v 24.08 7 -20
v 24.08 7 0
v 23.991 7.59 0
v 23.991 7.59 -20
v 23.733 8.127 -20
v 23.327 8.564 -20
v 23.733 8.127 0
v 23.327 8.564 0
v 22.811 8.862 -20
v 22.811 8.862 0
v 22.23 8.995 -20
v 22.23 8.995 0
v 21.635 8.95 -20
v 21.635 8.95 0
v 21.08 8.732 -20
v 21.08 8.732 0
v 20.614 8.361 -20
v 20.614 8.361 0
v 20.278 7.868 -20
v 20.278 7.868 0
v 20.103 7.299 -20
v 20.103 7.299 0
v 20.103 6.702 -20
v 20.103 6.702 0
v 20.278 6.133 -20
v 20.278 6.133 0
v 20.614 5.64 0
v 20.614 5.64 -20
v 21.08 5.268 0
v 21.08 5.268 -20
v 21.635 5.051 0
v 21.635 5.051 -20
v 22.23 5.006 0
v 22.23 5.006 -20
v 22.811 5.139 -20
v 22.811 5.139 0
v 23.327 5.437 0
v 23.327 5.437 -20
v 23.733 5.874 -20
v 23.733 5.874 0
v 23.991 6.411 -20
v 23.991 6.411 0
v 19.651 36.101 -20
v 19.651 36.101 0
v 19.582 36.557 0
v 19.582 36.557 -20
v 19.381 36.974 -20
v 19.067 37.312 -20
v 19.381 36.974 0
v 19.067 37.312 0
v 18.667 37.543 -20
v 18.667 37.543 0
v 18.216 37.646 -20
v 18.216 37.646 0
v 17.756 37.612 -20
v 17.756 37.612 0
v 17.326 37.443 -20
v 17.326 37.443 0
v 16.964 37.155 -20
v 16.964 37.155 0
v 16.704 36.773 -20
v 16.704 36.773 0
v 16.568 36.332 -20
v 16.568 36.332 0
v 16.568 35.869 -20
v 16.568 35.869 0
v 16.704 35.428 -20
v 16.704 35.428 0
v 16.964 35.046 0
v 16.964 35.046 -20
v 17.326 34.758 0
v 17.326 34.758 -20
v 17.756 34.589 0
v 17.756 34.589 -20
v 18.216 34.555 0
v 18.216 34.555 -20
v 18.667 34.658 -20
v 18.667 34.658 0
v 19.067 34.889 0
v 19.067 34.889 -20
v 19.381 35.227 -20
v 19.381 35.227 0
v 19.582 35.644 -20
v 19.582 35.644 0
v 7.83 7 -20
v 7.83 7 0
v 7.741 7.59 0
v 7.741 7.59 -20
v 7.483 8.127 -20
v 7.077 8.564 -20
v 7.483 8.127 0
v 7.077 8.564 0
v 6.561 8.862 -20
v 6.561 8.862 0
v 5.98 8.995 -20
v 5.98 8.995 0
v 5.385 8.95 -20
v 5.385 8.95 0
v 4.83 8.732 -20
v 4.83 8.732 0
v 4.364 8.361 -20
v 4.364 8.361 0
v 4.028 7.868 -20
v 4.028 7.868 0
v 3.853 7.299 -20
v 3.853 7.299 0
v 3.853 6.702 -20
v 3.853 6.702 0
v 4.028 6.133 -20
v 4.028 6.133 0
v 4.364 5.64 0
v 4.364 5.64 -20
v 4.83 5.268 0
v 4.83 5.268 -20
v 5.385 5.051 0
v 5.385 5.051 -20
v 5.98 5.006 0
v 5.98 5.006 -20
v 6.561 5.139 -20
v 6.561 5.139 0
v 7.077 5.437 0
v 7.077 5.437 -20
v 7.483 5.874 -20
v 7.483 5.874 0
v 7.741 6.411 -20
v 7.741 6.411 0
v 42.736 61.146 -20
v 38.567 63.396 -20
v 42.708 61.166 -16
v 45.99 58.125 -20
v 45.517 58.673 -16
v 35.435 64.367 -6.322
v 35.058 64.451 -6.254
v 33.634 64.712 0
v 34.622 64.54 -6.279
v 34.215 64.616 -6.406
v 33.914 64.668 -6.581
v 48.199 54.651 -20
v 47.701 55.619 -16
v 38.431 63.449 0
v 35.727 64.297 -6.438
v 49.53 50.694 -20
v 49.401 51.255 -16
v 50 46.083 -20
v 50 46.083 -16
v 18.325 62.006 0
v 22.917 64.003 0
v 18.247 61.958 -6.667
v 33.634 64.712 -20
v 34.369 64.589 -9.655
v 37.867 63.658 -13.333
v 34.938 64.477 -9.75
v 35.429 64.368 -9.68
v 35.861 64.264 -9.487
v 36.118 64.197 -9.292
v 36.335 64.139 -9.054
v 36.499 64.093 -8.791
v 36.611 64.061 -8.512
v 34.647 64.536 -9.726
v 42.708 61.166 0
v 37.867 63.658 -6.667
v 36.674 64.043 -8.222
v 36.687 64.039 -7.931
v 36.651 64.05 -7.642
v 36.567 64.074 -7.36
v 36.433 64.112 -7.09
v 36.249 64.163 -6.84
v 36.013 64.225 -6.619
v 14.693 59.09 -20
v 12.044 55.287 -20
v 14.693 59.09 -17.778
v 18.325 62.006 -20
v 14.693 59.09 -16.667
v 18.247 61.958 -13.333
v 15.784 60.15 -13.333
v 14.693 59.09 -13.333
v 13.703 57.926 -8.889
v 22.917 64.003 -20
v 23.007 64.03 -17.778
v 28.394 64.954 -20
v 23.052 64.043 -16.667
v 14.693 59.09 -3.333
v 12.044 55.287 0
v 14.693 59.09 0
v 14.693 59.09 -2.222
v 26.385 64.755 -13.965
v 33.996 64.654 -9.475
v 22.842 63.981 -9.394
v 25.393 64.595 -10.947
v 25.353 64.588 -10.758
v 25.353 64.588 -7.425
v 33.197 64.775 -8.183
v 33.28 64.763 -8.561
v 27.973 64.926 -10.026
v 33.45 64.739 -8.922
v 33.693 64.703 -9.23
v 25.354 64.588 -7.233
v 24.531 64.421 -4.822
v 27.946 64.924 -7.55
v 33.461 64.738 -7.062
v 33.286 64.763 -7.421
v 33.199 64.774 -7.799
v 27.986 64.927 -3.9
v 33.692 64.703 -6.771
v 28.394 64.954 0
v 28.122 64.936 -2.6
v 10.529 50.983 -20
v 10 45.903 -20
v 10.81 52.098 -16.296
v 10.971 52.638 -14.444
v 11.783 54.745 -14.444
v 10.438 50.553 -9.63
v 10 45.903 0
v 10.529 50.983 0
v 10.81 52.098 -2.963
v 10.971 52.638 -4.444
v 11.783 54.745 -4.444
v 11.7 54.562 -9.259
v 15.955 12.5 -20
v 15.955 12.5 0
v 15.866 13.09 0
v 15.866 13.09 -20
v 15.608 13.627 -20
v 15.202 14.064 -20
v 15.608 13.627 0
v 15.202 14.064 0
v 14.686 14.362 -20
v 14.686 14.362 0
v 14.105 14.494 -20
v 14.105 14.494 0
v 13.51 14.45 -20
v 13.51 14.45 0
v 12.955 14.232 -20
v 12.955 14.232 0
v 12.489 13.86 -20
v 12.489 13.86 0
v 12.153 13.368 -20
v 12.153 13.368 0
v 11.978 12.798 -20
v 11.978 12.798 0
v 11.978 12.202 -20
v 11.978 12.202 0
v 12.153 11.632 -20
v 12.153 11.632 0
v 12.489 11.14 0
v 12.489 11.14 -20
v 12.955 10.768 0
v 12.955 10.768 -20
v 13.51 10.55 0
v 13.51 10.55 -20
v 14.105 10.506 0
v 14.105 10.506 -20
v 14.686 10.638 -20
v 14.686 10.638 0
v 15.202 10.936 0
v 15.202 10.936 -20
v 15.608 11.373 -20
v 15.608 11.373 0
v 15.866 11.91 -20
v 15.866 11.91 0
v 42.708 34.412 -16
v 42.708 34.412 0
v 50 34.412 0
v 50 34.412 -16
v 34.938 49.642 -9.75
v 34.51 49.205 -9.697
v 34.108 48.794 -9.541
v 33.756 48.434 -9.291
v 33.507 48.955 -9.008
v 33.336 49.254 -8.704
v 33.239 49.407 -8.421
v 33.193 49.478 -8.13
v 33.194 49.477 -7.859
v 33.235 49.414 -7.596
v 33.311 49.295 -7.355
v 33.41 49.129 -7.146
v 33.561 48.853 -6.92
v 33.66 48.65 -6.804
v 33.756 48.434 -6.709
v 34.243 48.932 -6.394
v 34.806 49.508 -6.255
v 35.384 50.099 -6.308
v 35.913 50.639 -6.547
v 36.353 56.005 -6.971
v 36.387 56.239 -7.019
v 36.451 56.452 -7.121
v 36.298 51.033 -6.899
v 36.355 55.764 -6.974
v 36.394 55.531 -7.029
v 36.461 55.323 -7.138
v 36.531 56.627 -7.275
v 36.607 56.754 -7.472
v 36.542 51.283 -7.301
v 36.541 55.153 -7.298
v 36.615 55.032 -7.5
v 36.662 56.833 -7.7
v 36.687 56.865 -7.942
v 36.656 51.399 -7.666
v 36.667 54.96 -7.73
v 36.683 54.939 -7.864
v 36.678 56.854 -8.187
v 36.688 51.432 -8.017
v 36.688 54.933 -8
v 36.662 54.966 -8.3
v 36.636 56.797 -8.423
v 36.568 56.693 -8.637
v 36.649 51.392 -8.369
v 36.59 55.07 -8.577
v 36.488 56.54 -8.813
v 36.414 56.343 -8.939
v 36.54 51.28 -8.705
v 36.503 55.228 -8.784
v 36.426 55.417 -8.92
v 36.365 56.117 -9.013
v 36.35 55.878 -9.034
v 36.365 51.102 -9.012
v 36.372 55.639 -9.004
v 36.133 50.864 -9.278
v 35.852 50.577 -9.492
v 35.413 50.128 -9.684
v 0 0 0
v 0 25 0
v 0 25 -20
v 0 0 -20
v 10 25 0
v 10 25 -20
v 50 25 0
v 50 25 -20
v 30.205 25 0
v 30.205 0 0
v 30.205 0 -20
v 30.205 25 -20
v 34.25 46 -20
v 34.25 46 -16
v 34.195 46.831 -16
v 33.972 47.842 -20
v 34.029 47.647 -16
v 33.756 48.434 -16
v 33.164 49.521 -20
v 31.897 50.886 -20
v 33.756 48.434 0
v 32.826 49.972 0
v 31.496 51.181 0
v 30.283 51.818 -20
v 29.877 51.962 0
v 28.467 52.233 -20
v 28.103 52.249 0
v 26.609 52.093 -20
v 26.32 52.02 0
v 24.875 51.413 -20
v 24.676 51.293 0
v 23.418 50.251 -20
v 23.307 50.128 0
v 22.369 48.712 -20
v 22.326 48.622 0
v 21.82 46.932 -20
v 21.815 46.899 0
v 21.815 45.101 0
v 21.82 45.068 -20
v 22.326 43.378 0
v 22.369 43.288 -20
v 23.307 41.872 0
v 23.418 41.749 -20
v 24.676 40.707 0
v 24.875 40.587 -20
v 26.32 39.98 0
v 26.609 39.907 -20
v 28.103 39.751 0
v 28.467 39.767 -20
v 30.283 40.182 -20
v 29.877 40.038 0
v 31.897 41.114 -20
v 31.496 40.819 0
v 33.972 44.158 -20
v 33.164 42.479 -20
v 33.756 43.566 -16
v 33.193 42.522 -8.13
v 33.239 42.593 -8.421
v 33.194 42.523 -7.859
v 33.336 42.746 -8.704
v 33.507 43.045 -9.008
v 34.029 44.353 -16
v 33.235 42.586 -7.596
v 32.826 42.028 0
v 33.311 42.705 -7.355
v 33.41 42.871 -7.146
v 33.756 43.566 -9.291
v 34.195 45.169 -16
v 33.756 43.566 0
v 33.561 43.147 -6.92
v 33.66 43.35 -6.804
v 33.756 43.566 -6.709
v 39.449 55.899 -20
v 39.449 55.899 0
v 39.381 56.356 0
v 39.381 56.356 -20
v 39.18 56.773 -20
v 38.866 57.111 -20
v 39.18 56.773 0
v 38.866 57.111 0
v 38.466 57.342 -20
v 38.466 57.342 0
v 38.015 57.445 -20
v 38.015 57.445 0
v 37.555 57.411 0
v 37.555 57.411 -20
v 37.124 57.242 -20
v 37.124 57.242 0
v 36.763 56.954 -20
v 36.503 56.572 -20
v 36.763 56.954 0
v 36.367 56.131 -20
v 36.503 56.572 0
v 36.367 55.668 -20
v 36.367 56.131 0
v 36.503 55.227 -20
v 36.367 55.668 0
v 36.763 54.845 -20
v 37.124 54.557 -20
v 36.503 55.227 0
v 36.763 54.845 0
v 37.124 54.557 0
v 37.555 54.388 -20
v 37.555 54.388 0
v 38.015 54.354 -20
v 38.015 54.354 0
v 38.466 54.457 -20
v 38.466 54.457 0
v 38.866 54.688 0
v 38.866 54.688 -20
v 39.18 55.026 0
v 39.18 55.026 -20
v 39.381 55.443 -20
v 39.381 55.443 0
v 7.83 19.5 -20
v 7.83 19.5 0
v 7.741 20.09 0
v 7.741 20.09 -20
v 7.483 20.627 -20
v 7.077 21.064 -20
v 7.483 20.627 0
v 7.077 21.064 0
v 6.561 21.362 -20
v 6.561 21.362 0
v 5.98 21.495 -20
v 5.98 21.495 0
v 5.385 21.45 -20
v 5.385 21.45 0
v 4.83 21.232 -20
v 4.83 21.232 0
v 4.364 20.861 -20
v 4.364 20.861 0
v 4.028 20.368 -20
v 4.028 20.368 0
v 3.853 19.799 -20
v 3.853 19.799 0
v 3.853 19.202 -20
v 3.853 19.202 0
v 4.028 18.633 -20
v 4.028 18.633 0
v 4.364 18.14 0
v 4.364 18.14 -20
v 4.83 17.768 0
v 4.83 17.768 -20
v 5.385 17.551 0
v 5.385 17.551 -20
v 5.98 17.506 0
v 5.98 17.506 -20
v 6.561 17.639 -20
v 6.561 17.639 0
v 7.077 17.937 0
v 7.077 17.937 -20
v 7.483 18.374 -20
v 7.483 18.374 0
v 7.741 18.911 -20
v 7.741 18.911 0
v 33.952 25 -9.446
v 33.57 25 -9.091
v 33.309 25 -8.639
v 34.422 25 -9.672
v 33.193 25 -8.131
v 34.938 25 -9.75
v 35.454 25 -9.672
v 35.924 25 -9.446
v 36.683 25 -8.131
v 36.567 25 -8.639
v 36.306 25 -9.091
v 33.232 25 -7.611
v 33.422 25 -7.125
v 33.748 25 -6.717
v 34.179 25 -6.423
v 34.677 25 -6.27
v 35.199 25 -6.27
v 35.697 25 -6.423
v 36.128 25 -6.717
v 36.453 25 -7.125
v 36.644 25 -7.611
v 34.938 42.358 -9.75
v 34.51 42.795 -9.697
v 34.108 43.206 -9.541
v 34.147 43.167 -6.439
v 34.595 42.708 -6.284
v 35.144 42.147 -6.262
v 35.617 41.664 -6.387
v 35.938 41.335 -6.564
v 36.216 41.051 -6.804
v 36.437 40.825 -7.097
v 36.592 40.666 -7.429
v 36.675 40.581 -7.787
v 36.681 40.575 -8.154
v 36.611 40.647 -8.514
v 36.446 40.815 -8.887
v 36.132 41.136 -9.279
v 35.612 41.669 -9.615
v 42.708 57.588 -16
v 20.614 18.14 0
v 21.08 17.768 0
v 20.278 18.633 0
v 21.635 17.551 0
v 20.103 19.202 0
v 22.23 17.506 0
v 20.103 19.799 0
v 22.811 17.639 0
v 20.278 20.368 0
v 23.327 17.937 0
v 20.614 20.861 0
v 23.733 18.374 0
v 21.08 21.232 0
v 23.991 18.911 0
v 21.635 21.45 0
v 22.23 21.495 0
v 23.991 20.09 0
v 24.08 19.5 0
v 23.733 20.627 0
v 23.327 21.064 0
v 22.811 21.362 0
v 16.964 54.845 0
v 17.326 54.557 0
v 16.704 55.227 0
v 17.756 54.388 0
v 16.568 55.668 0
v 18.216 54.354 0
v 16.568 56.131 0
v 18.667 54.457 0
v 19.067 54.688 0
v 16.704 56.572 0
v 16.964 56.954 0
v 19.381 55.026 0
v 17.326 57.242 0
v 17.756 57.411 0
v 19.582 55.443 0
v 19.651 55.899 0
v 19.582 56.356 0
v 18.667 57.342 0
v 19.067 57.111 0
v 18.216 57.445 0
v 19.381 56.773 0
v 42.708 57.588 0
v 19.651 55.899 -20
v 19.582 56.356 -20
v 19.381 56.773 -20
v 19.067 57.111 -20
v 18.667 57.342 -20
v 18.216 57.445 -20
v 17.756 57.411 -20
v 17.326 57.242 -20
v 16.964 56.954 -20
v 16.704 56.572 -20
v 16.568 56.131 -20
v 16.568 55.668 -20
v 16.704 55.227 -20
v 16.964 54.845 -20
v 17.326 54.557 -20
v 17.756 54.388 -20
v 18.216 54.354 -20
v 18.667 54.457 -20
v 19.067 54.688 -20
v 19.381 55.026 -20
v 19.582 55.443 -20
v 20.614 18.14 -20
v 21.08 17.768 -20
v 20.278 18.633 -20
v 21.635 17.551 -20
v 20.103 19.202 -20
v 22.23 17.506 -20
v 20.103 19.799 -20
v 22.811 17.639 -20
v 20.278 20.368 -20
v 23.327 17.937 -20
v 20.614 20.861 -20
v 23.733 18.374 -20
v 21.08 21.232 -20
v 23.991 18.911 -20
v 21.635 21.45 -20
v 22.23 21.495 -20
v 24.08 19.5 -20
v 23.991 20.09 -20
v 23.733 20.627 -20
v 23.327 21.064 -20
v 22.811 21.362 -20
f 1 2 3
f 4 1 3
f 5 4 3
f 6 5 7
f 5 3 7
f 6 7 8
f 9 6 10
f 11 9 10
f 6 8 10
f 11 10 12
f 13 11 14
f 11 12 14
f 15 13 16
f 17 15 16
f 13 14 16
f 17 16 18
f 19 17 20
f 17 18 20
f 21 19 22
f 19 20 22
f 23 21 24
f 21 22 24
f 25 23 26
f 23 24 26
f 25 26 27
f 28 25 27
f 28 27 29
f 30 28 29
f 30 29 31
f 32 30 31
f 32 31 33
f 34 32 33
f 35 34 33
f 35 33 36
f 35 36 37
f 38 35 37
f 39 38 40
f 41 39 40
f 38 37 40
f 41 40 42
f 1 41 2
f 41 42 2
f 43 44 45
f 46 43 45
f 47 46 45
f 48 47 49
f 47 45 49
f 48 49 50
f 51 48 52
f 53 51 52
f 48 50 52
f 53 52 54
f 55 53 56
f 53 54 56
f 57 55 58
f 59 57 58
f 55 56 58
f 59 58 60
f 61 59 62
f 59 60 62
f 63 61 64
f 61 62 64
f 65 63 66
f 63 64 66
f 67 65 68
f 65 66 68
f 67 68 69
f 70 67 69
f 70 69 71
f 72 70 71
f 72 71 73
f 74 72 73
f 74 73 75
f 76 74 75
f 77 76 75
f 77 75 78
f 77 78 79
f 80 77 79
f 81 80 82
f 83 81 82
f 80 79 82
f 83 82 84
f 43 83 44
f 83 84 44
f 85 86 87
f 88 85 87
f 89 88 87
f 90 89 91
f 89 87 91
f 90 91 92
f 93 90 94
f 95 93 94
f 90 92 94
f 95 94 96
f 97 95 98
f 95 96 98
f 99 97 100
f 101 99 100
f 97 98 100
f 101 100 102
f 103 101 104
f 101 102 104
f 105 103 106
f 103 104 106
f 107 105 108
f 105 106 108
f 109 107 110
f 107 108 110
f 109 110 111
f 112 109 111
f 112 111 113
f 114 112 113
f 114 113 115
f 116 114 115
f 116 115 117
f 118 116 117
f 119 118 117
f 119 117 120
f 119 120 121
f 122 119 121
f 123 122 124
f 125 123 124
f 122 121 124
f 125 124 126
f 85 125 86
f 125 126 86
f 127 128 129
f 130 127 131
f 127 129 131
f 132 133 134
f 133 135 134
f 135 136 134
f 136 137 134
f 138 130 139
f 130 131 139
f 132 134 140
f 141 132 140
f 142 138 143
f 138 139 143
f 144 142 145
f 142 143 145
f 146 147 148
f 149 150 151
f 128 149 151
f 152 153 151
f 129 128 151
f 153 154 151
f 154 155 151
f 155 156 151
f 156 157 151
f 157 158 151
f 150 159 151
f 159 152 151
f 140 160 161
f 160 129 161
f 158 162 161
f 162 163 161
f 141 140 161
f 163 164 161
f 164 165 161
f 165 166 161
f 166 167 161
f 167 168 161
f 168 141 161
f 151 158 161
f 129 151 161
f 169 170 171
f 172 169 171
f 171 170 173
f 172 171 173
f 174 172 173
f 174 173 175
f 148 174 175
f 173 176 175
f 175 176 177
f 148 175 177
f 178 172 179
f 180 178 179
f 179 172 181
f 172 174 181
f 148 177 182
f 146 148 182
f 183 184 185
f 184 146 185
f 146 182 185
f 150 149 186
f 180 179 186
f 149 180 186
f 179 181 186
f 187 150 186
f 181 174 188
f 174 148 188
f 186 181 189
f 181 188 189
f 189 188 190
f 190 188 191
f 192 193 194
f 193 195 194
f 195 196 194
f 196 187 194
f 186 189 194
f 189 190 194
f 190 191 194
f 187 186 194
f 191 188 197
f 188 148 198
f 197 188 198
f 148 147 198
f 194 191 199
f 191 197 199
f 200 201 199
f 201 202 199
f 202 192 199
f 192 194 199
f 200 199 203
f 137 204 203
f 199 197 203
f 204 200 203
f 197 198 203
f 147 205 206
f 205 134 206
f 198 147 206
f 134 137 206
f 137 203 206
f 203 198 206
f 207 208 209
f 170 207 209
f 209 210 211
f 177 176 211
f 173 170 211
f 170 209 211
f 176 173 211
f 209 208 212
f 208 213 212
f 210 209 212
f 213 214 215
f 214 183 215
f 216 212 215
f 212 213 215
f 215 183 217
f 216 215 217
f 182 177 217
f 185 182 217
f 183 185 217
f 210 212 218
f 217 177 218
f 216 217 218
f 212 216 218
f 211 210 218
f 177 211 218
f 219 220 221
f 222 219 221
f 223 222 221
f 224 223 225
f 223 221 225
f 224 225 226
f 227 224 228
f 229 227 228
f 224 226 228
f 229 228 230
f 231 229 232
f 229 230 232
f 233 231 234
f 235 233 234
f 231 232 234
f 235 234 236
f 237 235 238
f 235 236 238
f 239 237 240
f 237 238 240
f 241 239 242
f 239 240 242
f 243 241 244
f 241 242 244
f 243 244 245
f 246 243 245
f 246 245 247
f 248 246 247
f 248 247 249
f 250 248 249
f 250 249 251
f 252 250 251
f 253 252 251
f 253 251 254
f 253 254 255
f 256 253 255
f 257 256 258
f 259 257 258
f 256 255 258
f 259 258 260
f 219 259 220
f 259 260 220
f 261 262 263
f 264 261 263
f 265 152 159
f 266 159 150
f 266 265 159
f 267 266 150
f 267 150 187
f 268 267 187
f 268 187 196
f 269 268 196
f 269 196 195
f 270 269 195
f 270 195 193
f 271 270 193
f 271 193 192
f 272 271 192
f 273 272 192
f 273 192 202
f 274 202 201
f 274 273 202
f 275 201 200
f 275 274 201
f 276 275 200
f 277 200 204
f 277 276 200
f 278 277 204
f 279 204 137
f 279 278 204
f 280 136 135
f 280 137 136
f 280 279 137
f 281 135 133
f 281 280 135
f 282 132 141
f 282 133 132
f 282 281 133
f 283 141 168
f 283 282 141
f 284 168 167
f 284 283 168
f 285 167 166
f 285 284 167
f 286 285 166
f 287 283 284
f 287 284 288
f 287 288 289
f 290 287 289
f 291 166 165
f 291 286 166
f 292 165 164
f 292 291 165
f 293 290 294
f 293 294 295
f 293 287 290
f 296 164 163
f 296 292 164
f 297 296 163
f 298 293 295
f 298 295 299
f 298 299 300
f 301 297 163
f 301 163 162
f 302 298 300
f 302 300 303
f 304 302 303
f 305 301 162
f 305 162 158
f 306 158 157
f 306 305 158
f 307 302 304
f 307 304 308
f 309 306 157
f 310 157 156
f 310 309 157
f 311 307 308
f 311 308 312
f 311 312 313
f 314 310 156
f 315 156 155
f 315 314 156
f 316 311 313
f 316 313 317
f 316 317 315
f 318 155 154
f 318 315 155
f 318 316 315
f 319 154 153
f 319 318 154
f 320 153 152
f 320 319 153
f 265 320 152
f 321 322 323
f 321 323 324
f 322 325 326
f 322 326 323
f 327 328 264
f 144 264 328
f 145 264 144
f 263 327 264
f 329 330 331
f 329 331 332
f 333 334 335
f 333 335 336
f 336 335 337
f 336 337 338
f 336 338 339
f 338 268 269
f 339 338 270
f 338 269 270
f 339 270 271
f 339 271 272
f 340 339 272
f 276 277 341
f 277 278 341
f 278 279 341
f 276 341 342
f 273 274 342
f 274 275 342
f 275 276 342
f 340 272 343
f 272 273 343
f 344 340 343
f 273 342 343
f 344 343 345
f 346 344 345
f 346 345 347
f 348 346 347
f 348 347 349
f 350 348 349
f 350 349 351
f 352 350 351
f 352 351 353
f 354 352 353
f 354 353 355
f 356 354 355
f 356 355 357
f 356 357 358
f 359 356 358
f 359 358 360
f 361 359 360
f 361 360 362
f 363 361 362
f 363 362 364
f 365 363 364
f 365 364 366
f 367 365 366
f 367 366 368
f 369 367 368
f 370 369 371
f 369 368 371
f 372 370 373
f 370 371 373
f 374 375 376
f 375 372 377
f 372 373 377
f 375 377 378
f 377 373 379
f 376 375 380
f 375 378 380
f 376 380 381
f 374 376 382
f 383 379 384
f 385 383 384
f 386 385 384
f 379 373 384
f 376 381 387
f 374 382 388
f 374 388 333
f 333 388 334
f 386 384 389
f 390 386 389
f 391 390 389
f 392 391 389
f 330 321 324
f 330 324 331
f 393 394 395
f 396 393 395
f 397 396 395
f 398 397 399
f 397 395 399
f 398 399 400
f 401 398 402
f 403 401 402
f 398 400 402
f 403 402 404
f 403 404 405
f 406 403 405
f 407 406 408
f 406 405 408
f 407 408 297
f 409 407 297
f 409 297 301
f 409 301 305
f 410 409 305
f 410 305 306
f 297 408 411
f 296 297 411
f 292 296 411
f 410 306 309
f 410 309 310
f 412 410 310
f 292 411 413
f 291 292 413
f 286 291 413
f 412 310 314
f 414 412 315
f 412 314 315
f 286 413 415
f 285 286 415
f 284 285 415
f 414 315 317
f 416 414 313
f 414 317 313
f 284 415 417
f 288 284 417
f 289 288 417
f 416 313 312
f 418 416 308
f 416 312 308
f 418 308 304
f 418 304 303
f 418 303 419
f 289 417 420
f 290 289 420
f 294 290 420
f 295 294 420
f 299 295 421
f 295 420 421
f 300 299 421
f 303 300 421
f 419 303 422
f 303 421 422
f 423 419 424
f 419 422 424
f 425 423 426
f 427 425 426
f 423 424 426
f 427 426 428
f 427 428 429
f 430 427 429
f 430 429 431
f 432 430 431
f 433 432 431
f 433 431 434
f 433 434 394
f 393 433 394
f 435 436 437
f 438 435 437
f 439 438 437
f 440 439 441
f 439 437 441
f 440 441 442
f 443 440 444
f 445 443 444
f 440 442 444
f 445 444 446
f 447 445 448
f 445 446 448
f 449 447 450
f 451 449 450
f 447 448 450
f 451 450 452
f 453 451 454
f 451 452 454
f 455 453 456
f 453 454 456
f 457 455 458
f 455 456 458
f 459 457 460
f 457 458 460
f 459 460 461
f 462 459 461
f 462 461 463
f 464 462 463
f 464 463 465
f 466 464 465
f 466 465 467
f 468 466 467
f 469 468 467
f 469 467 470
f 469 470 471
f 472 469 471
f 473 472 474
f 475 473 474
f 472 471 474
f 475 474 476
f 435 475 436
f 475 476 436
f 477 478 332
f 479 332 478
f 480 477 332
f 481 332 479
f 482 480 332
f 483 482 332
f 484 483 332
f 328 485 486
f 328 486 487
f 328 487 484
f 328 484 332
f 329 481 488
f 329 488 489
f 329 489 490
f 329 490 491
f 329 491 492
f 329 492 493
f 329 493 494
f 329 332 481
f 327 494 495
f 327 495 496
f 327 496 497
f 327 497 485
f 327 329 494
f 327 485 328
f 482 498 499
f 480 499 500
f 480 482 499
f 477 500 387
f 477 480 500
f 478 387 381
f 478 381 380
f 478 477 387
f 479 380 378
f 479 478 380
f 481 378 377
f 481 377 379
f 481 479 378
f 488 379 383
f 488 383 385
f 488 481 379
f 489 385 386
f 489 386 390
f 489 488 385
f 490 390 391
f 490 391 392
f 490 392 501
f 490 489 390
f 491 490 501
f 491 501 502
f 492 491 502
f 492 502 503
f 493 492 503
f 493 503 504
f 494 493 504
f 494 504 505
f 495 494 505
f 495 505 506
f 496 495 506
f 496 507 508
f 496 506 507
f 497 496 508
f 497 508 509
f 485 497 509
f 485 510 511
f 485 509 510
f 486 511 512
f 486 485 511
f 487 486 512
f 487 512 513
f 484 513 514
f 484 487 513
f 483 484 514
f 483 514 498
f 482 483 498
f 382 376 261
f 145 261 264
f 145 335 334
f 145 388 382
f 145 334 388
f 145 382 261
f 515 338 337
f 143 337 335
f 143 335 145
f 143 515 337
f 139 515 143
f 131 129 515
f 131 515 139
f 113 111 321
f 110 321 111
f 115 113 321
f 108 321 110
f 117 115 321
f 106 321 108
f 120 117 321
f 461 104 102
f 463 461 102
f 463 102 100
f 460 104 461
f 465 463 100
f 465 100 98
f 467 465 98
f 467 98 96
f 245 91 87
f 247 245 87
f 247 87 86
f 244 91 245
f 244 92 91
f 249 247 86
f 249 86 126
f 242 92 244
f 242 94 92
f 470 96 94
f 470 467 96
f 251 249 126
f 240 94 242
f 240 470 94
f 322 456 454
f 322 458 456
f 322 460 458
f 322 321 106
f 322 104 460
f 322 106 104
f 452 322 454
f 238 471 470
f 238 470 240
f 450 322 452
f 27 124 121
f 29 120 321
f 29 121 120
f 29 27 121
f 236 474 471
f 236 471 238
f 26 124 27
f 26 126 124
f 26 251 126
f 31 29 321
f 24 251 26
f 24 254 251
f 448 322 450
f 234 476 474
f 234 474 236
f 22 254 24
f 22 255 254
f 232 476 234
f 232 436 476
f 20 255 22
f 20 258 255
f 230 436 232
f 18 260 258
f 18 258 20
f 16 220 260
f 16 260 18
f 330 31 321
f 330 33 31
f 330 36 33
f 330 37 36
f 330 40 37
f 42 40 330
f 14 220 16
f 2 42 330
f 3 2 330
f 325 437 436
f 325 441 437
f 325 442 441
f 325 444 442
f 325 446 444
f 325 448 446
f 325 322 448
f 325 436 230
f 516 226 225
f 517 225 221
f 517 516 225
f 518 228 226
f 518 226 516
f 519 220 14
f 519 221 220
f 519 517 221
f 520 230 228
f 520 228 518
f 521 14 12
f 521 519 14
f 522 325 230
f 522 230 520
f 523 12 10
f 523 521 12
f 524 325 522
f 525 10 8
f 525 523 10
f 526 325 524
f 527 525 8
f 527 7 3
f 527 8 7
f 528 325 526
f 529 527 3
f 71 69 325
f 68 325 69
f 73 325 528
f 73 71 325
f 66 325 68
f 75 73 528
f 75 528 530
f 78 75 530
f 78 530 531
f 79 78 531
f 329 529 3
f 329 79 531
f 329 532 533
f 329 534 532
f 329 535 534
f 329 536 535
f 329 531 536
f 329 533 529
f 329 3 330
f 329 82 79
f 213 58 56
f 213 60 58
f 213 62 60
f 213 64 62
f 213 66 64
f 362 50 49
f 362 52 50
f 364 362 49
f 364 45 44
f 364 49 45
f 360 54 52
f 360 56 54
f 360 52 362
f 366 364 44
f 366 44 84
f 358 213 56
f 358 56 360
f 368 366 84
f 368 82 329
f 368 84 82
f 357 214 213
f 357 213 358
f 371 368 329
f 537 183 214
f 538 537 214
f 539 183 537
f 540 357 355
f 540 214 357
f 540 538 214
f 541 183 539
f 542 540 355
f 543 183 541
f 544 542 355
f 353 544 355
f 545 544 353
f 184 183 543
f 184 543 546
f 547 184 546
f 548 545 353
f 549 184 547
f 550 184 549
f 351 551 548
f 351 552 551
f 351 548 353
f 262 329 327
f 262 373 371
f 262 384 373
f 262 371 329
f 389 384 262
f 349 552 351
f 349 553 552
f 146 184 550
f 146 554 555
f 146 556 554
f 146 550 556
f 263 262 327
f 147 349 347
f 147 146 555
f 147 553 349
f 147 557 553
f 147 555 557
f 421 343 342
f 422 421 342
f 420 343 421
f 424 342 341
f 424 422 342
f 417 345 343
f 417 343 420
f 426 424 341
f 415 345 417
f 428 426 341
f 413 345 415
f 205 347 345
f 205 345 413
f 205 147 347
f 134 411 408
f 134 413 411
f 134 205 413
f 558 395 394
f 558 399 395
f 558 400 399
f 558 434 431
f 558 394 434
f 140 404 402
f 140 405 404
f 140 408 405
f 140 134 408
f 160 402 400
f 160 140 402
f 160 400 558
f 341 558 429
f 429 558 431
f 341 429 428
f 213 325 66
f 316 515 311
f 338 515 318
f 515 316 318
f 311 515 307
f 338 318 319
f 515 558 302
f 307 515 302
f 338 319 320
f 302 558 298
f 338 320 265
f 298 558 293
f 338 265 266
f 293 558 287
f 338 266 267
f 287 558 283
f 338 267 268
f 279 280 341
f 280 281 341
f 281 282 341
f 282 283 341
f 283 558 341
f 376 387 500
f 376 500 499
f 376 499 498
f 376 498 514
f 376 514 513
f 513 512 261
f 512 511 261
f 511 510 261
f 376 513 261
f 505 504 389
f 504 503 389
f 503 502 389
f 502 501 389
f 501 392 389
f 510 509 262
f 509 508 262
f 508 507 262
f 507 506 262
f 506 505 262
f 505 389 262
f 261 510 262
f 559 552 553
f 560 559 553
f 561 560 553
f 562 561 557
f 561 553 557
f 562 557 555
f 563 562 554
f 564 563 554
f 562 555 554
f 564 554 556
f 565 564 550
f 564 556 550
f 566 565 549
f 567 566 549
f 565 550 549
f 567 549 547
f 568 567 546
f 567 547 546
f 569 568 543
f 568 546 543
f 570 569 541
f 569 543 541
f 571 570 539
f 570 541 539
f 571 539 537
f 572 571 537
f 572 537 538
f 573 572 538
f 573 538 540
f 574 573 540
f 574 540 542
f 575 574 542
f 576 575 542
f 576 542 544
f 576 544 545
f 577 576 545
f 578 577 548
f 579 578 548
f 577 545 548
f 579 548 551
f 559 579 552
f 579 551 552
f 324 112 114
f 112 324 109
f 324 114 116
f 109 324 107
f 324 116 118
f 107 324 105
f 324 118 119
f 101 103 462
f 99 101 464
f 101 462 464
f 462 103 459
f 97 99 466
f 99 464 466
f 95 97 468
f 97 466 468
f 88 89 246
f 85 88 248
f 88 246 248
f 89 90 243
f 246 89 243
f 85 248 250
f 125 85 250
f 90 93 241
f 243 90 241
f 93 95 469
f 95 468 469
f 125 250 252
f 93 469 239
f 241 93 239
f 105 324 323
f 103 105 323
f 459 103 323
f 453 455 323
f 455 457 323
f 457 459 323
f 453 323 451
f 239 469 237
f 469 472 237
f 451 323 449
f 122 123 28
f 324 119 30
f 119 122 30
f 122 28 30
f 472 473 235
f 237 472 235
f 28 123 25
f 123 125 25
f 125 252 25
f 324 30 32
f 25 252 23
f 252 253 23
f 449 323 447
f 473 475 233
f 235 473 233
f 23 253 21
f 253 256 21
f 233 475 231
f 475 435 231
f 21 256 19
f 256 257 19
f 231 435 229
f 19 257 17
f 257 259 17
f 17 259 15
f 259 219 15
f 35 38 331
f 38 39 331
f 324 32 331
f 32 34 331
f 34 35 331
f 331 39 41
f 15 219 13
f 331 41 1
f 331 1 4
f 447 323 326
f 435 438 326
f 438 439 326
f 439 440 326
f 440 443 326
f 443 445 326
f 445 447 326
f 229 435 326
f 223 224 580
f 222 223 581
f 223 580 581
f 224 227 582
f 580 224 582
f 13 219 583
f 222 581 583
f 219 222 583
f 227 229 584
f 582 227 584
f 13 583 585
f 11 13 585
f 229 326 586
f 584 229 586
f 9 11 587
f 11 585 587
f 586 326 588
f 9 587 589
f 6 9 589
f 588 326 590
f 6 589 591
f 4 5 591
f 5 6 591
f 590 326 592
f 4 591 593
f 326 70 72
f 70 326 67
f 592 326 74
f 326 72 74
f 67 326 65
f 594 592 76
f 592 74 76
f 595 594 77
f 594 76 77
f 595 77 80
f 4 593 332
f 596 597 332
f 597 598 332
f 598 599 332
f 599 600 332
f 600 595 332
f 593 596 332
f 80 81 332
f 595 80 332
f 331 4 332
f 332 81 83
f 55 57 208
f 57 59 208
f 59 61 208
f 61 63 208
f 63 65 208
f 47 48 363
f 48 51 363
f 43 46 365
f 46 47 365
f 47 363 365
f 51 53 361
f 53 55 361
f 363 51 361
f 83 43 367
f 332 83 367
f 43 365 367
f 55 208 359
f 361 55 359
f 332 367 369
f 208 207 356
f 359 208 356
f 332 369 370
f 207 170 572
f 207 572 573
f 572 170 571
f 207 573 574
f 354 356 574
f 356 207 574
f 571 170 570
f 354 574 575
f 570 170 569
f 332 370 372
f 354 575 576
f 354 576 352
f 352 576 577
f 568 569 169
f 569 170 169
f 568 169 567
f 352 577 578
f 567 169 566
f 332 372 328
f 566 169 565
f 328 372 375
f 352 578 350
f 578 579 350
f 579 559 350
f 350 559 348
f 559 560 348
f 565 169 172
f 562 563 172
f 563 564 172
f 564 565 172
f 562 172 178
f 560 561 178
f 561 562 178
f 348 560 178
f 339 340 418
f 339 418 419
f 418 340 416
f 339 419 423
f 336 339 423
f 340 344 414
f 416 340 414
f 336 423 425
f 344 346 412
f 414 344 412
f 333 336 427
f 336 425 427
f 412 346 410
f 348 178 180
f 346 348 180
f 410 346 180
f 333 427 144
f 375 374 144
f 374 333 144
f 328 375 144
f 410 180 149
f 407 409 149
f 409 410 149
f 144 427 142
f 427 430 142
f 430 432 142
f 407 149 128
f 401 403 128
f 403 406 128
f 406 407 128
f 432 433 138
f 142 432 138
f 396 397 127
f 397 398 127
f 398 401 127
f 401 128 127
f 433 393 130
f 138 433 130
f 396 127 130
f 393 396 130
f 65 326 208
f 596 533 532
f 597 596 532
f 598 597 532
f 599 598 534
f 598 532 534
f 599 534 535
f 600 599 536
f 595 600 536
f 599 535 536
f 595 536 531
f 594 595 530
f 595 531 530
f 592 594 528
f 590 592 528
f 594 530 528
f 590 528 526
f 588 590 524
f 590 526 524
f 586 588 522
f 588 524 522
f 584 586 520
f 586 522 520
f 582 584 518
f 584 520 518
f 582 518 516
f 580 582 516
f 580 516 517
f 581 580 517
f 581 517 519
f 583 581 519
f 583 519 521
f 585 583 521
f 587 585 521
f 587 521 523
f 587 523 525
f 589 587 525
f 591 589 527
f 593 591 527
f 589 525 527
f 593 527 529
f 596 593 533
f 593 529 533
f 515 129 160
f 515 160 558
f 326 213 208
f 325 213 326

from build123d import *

# Parameters (mm, degrees)
SCHIZZO1_R                   = 2
SCHIZZO1_R_2                 = 1.55
SCHIZZO1_R_3                 = 6.25
ESTRUSIONE_ESTRUSIONE1_DEPTH = 20
TAGLIO_ESTRUSIONE3_DEPTH     = 16
SCHIZZO5_R                   = 1.75
TAGLIO_ESTRUSIONE4_DEPTH     = 68.079836494


with BuildPart() as part:
    # Schizzo1 → Estrusione-Estrusione1 (new body)
    with BuildSketch(Plane.XY):
        with BuildLine():
            Line((0, 0), (30.205221293, 0))
            Line((30.205221293, 0), (30.205221293, 25.000000003))
            Line((30.205221293, 25.000000003), (50, 25.000000003))
            Line((50, 25.000000003), (50, 46.083449556))
            add(Edge.make_bspline(
                [(10, 45.902878326), (10, 53.523029111), (16.665197751, 64.749431614), (39.917897707, 66.566627657), (50, 55.41391796), (50, 46.083449556)],
                knots=[0, 0, 0, 0, 0.305409074, 0.638645938, 1, 1, 1, 1], degree=3))
            Line((10, 45.902878326), (10, 25))
            Line((10, 25), (0, 25))
            Line((0, 25), (0, 0))
        make_face()
        with Locations((5.830221293, 7.000447051)):
            Circle(SCHIZZO1_R, mode=Mode.SUBTRACT)
        with Locations((13.955221293, 12.5)):
            Circle(SCHIZZO1_R, mode=Mode.SUBTRACT)
        with Locations((22.080221293, 7.000447051)):
            Circle(SCHIZZO1_R, mode=Mode.SUBTRACT)
        with Locations((22.080221293, 19.500447051)):
            Circle(SCHIZZO1_R, mode=Mode.SUBTRACT)
        with Locations((5.830221293, 19.500447051)):
            Circle(SCHIZZO1_R, mode=Mode.SUBTRACT)
        with Locations((37.899494937, 55.899494937)):
            Circle(SCHIZZO1_R_2, mode=Mode.SUBTRACT)
        with Locations((28, 46)):
            Circle(SCHIZZO1_R_3, mode=Mode.SUBTRACT)
        with Locations((18.100505063, 36.100505063)):
            Circle(SCHIZZO1_R_2, mode=Mode.SUBTRACT)
        with Locations((18.100505063, 55.899494937)):
            Circle(SCHIZZO1_R_2, mode=Mode.SUBTRACT)
    extrude(amount=-ESTRUSIONE_ESTRUSIONE1_DEPTH)

    # Schizzo4 → Taglio-Estrusione3 (cut)
    with BuildSketch(Plane.XY):
        Polygon((42.707691964, 34.412315024), (50, 34.412315024), (50, 57.587684976), (50, 63.39531064), (42.707691964, 63.39531064), (42.707691964, 57.587684976), (33.442882673, 48.113516989), (33.442882673, 43.886483011), align=None)
    extrude(amount=-TAGLIO_ESTRUSIONE3_DEPTH, mode=Mode.SUBTRACT)

    # Schizzo5 → Taglio-Estrusione4 (cut, through all)
    with BuildSketch(Plane(origin=(0, 25.000000003, 0), x_dir=(1, 0, 0), z_dir=(0, 1, 0))):
        with Locations(Location((34.937925583, 8, 0), (0, 0, 90))):
            Circle(SCHIZZO5_R)
    extrude(amount=TAGLIO_ESTRUSIONE4_DEPTH, mode=Mode.SUBTRACT)


solid = part.part
